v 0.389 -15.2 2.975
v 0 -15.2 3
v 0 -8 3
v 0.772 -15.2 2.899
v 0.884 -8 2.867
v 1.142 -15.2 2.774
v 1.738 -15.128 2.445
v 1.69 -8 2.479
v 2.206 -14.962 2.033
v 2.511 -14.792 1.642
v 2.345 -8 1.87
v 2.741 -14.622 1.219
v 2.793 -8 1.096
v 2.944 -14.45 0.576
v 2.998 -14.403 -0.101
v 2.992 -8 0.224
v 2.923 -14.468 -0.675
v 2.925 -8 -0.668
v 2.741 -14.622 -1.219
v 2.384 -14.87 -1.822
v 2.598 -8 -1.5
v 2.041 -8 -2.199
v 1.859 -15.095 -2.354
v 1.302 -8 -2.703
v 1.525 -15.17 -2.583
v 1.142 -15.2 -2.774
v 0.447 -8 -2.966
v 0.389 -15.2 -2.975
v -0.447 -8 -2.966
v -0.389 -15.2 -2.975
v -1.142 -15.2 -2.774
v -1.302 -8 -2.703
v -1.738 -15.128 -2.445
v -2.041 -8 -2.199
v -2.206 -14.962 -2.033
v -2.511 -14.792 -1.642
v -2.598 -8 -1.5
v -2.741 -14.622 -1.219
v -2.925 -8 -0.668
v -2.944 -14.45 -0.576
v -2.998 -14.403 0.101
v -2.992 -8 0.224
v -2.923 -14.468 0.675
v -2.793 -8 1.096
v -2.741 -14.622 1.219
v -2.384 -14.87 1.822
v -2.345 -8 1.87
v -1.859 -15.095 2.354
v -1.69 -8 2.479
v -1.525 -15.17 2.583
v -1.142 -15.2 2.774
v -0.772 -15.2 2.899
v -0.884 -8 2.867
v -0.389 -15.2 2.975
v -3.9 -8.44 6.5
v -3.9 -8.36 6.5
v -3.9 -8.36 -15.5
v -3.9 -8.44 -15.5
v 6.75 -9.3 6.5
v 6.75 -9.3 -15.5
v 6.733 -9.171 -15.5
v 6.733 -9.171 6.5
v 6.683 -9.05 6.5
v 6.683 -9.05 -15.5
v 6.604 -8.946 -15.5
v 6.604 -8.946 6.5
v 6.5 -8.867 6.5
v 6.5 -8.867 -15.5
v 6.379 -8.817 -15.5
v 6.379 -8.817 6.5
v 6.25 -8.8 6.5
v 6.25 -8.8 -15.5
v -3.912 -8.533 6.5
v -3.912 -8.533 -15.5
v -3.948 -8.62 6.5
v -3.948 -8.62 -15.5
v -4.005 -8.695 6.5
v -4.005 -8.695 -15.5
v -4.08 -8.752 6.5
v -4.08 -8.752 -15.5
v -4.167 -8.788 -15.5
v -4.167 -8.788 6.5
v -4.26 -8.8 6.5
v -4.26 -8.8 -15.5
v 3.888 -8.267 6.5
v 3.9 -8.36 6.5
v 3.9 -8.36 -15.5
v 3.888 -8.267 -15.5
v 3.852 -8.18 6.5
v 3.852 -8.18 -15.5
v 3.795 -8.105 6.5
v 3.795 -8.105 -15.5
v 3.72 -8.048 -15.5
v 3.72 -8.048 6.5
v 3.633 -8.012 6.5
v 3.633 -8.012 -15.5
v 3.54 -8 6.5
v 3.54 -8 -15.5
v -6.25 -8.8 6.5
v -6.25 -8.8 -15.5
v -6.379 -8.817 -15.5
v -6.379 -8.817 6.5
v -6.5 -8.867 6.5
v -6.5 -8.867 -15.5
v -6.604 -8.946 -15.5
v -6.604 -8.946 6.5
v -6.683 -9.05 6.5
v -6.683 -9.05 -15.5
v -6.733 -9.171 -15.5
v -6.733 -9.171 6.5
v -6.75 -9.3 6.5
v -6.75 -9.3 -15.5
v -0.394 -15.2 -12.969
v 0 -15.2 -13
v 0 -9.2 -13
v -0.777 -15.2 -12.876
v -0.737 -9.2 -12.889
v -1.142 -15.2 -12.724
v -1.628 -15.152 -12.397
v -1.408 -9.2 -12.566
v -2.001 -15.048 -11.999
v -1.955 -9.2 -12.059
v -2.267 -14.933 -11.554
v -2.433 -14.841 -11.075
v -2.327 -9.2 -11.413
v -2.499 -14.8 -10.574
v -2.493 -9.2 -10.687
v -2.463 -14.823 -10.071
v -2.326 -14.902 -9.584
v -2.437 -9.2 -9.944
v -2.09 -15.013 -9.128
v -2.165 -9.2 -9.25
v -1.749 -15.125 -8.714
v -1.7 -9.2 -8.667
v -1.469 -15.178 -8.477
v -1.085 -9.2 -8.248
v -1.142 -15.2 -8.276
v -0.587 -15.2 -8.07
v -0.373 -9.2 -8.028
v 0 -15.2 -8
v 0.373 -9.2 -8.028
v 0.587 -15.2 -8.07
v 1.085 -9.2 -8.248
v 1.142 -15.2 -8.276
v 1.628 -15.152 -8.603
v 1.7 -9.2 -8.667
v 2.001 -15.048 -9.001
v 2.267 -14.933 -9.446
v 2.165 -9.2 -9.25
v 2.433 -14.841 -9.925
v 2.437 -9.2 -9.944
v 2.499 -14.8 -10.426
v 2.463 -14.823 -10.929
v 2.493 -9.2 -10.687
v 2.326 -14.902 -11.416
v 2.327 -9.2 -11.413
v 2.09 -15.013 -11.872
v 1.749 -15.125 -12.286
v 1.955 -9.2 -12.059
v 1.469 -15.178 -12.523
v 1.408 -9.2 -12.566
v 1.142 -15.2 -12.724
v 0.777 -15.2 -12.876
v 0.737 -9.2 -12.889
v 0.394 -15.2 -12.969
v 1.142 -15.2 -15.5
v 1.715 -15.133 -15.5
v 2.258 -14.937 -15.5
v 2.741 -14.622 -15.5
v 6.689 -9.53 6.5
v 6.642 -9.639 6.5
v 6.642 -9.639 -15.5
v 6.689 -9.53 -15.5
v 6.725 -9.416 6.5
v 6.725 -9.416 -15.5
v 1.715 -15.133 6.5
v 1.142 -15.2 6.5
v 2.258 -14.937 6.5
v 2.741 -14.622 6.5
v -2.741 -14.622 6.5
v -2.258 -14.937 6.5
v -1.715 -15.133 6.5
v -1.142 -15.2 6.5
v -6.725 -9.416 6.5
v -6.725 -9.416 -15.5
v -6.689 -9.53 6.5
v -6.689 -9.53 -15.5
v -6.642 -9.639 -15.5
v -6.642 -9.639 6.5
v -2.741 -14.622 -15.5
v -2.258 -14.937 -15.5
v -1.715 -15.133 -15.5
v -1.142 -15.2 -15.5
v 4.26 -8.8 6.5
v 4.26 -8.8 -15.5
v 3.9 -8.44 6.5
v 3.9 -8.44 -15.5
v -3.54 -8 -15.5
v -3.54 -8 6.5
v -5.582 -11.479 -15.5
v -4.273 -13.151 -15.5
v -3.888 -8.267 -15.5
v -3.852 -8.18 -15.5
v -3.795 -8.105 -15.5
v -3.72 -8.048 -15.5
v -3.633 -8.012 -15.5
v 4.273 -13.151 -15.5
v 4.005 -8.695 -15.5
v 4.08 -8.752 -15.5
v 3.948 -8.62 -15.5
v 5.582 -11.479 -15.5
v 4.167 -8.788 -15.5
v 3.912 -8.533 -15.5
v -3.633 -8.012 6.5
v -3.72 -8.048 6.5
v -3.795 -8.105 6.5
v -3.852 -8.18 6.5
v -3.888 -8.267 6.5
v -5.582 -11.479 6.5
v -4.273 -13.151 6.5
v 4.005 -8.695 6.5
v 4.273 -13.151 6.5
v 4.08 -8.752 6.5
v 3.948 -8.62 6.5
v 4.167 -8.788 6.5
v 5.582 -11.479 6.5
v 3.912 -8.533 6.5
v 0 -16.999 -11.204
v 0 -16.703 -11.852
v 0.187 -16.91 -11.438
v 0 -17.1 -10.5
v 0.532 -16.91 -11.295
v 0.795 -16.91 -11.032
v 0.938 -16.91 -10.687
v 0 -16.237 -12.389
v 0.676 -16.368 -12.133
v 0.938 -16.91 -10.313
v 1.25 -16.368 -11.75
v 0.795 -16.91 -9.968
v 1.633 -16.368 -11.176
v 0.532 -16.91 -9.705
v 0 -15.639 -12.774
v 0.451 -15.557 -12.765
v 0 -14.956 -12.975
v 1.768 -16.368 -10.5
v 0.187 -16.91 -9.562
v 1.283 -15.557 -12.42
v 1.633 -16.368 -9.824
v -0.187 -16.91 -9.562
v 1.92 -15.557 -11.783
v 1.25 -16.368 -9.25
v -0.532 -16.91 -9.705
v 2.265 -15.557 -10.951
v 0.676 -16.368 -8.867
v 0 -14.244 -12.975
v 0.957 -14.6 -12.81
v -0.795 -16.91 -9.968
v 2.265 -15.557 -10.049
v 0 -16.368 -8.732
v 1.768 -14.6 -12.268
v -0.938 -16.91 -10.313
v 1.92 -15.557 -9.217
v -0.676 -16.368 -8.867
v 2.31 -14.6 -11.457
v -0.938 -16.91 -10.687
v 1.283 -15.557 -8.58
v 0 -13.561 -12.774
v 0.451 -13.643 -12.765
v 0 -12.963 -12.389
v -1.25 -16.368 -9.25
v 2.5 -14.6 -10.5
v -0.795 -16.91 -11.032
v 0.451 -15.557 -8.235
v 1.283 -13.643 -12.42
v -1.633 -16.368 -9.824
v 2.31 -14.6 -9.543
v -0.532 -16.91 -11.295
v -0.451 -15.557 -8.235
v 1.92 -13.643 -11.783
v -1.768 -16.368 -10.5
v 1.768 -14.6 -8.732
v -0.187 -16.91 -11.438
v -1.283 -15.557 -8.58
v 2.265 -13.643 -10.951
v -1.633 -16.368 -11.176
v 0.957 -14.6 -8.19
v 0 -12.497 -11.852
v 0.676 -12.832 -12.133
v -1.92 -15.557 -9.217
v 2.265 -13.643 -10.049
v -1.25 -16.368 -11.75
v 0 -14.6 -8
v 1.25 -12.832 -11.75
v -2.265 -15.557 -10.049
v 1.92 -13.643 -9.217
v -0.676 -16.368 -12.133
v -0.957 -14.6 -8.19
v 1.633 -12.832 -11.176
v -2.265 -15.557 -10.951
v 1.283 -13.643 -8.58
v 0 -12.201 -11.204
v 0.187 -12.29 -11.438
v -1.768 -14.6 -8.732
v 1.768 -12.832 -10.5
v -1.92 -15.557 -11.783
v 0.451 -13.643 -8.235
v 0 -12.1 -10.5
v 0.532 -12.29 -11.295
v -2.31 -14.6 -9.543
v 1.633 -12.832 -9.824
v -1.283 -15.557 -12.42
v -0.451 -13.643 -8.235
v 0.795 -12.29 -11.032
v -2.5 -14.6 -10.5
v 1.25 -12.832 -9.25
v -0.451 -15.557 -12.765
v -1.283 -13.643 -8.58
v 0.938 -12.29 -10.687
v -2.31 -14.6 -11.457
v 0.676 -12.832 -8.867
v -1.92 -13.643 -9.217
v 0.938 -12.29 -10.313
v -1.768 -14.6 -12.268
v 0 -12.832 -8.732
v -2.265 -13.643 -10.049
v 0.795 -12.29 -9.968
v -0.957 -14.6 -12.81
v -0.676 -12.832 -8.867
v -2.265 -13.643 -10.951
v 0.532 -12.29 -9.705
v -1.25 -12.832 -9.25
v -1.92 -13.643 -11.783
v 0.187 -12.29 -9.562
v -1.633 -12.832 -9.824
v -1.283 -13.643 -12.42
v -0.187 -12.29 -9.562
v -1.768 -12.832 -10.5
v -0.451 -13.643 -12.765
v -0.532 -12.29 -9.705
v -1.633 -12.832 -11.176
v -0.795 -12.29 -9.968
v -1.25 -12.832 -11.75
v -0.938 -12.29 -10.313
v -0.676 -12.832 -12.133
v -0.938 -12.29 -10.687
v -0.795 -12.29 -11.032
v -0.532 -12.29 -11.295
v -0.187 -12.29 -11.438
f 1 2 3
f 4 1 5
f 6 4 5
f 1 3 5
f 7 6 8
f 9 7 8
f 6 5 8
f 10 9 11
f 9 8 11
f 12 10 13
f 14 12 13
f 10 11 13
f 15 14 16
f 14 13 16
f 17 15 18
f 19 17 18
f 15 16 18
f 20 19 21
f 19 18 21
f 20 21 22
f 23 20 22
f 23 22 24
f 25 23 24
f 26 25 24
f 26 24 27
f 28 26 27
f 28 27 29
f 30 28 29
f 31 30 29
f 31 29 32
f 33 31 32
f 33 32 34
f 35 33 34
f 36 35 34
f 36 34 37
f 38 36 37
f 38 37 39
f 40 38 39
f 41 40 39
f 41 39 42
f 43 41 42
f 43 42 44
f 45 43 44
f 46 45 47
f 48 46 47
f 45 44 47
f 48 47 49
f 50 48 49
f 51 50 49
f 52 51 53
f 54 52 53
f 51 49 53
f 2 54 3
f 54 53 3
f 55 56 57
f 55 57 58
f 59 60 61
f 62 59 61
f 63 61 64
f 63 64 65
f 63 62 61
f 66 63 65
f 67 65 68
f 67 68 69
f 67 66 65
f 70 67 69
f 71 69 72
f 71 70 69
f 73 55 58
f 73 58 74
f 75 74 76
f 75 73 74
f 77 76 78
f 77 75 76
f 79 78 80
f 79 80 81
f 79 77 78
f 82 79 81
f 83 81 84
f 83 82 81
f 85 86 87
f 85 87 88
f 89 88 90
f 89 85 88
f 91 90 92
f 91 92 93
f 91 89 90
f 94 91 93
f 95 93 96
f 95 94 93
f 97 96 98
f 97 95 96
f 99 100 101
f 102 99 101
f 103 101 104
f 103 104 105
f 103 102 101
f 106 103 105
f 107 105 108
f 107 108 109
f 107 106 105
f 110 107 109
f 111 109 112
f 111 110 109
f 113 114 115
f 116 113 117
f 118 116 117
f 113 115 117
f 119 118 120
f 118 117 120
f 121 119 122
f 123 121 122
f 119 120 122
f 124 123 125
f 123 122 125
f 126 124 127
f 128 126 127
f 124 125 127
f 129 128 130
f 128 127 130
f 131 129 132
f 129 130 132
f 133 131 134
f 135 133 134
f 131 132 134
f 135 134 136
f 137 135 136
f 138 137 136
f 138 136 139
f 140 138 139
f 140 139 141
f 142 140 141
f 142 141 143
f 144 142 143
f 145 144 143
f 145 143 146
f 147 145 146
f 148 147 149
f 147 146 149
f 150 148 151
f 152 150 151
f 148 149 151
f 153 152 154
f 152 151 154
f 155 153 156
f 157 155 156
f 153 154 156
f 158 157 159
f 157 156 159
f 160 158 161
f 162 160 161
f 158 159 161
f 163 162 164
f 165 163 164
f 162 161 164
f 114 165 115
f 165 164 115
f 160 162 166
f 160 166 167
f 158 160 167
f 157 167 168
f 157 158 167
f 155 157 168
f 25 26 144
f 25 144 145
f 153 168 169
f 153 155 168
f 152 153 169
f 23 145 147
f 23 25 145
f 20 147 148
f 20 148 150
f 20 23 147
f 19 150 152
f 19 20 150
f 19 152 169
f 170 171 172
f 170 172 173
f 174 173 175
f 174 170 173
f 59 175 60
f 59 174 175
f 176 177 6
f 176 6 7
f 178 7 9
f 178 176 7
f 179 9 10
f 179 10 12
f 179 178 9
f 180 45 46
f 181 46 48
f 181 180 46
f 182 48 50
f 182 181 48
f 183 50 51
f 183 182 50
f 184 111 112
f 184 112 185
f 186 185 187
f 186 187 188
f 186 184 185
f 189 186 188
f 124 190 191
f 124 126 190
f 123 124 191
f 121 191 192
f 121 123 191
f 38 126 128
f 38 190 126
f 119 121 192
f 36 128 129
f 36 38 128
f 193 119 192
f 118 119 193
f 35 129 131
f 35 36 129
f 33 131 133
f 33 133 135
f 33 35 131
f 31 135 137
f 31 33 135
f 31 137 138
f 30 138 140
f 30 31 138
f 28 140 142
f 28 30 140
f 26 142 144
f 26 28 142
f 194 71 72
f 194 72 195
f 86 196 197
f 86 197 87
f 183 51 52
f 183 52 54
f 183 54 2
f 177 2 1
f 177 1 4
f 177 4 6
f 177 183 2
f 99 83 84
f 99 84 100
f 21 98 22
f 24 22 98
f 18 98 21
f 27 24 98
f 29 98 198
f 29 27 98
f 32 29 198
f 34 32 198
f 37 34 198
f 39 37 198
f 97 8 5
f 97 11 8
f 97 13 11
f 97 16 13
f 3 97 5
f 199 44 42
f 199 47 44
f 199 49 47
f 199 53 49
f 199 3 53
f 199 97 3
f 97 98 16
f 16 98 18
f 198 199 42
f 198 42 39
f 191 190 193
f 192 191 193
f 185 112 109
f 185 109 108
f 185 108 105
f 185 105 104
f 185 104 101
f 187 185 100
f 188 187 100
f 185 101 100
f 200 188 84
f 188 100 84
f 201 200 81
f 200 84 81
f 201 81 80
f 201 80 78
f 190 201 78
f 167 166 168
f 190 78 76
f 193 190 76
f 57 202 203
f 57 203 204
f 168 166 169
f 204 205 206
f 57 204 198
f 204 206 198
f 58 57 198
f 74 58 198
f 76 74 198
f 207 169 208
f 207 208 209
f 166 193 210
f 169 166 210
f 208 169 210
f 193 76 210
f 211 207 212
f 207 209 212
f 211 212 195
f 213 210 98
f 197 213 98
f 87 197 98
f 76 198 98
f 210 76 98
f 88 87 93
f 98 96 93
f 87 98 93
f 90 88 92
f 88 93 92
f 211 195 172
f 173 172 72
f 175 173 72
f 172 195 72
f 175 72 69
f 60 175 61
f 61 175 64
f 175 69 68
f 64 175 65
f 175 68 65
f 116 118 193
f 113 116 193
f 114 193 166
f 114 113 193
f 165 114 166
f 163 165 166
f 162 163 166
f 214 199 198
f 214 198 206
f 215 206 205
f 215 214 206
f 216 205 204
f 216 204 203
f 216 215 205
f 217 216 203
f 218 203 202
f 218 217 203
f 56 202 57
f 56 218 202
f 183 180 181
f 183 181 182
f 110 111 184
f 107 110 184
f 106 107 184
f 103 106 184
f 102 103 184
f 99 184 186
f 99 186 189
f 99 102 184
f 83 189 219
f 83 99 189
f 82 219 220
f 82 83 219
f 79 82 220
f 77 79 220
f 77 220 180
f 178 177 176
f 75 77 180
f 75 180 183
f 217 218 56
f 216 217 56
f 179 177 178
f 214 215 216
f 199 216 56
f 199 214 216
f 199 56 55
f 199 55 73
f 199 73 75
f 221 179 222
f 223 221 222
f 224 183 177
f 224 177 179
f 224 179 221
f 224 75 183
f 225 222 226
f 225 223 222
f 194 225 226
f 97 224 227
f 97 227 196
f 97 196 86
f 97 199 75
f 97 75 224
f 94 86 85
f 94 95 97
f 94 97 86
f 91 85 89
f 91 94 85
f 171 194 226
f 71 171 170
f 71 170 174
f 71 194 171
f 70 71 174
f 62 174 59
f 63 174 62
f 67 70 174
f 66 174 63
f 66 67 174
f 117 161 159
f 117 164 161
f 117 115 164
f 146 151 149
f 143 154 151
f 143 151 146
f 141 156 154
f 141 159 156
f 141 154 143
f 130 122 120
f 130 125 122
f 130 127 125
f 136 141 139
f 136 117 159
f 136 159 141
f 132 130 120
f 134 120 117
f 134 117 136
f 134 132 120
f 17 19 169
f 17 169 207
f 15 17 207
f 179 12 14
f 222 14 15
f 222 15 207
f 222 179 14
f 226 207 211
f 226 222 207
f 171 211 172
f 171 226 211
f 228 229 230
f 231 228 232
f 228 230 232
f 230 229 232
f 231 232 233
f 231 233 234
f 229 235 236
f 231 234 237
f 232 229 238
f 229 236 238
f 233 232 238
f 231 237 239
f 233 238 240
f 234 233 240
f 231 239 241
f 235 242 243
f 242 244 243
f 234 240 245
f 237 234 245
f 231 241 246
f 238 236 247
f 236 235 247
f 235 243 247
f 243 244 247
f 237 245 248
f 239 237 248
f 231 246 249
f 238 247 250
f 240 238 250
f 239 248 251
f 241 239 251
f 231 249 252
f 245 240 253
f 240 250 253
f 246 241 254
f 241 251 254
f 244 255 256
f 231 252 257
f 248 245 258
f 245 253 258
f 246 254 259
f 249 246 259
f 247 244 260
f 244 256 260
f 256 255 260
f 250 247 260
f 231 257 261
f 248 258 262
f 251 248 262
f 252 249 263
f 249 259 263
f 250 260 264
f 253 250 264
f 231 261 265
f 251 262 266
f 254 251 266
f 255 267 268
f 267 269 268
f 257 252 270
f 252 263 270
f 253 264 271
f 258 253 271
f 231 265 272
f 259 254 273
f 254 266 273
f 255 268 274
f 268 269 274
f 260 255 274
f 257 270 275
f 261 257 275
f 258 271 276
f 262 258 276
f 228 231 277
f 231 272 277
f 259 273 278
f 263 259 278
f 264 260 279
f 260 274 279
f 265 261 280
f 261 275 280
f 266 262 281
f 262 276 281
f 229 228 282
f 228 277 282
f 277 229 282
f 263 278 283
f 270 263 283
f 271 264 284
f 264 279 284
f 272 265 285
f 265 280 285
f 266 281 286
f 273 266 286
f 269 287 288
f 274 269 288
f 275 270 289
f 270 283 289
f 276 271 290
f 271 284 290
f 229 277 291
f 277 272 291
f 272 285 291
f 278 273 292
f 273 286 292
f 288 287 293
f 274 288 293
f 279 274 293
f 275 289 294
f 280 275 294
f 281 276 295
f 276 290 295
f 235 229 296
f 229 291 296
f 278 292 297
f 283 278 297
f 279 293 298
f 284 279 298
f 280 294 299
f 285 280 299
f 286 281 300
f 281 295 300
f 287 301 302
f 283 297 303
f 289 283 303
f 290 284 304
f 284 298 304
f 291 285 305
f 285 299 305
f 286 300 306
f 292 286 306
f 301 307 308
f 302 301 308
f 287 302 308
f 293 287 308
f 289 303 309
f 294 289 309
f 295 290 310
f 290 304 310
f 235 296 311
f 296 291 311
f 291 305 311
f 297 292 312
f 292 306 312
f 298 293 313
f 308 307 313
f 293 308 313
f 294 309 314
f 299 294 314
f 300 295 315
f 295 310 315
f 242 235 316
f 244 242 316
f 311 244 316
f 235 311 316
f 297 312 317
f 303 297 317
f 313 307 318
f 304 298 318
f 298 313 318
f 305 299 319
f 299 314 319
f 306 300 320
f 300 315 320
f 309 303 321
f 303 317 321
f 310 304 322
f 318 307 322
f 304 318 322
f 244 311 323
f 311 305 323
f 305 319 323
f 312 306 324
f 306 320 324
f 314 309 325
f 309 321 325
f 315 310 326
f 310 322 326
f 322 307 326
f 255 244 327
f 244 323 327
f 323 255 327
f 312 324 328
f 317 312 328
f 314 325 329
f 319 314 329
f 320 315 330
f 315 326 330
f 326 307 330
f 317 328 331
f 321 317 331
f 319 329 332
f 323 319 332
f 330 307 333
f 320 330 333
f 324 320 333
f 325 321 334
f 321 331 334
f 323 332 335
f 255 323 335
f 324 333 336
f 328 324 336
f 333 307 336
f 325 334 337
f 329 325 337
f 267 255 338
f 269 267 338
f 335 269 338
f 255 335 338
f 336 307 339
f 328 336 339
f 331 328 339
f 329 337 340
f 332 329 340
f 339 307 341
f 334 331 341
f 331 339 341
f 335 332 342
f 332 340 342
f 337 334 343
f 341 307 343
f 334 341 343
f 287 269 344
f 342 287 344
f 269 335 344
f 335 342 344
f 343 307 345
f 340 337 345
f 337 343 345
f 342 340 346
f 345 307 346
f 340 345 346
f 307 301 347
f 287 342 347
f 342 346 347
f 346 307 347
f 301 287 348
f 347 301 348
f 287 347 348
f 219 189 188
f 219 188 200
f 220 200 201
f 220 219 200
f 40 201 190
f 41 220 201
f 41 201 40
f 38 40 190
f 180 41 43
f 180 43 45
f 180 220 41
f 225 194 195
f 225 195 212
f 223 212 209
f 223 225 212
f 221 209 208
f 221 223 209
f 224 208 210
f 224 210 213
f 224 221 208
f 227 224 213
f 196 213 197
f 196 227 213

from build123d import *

# Parameters (mm, degrees)
SKETCH1_R           = 3
BOSS_EXTRUDE1_DEPTH = 16
CUT_SWEEP1_PITCH    = 1
SKETCH4_OUTSIDE_W   = 13.622
SKETCH4_OUTSIDE_H   = 13.622
SKETCH4_OUTSIDE_R   = 2.242227772
CUT_EXTRUDE1_DEPTH  = 1
CUT_EXTRUDE1_DRAFT  = -45
CUT_EXTRUDE2_DEPTH  = 2.4
BOSS_EXTRUDE2_START = 6.5
BOSS_EXTRUDE2_DEPTH = 22
SKETCH9_R           = 3
CUT_EXTRUDE4_DEPTH  = 24.276866267
SKETCH10_W          = 2.5
SKETCH10_H          = 6


with BuildPart() as part:
    # Sketch1 → Boss-Extrude1 (new body)
    with BuildSketch(Plane(origin=(0, 0, 0), x_dir=(1, 0, 0), z_dir=(0, 1, 0))):
        with Locations(Location((0, 0, 0), (0, 0, 270))):
            Circle(SKETCH1_R)
    extrude(amount=-BOSS_EXTRUDE1_DEPTH)

    # Cut-Sweep1: arcs per turn and ends read off the stored shape
    # Cut-Sweep1: the profile of Sketch3 screwed along a right-hand helix through 18 turns, 8 arcs to a turn; built about Z, then put on its axis
    cut_sweep1_z = Axis((0, 0, 0), (0, 0, 1))
    cut_sweep1_corners = [(2.350480947, 0, -1.375), (3.054126588, 0, -0.96875), (3.054126588, 0, -1.90625), (2.350480947, 0, -1.5)]
    with BuildLine(mode=Mode.PRIVATE) as cut_sweep1_profile:
        Line(cut_sweep1_corners[0], cut_sweep1_corners[1])
        Line(cut_sweep1_corners[1], cut_sweep1_corners[2])
        Line(cut_sweep1_corners[2], cut_sweep1_corners[3])
        Line(cut_sweep1_corners[3], cut_sweep1_corners[0])
    cut_sweep1_cap = Face(cut_sweep1_profile.wire())
    cut_sweep1_turn_angles = [0, 22.5, 45, 67.5, 90, 112.5, 135, 157.5, 180, 202.5, 225, 247.5, 270, 292.5, 315, 337.5, 360]
    cut_sweep1_turn_weights = [1, 0.9238795325112867, 1, 0.9238795325112867, 1, 0.9238795325112867, 1, 0.9238795325112867, 1, 0.9238795325112867, 1, 0.9238795325112867, 1, 0.9238795325112867, 1, 0.9238795325112867, 1]
    cut_sweep1_turn_rails = [Edge.make_bspline([Vector(p[0], p[1], 0).rotate(cut_sweep1_z, cut_sweep1_turn_angles[k]) / cut_sweep1_turn_weights[k] + Vector(0, 0, p[2] + CUT_SWEEP1_PITCH * cut_sweep1_turn_angles[k] / 360) for k in range(17)], [0, 0, 0, 1, 1, 2, 2, 3, 3, 4, 4, 5, 5, 6, 6, 7, 7, 8, 8, 8], 2, cut_sweep1_turn_weights) for p in cut_sweep1_corners]
    cut_sweep1_turn_sides = [Face.make_surface_from_curves(cut_sweep1_turn_rails[p[0]], cut_sweep1_turn_rails[p[1]]) for p in [(0, 1), (1, 2), (2, 3), (3, 0)]]
    cut_sweep1 = Plane(origin=(0, -16, 0), x_dir=(0, 0, -1), z_dir=(0, 1, 0)) * Solid(Shell([*[p.moved(Location((0, 0, CUT_SWEEP1_PITCH * i))) for i in range(18) for p in cut_sweep1_turn_sides], cut_sweep1_cap, cut_sweep1_cap.rotate(cut_sweep1_z, 6480).moved(Location((0, 0, CUT_SWEEP1_PITCH * 6480 / 360)))]))
    add(cut_sweep1, mode=Mode.SUBTRACT)


with BuildPart() as cut_extrude1_tool:
    # Sketch4 outside → Cut-Extrude1 (with draft: the straight prism first)
    with BuildSketch(Plane.XZ.offset(16)):
        Rectangle(SKETCH4_OUTSIDE_W, SKETCH4_OUTSIDE_H)
        Circle(SKETCH4_OUTSIDE_R, mode=Mode.SUBTRACT)
    extrude(amount=-CUT_EXTRUDE1_DEPTH)
    # Cut-Extrude1: the draft: its side faces are tilted about the plane it starts from
    cut_extrude1_sides = [cut_extrude1_tool.faces().sort_by_distance(p)[0] for p in [
        (0, -15.5, -6.811),
        (6.811, -15.5, 0),
        (0, -15.5, 6.811),
        (-6.811, -15.5, 0),
        (-2.242227772, -15.5, 0),
    ]]
    draft(cut_extrude1_sides, Plane.XZ.offset(16), CUT_EXTRUDE1_DRAFT)


with BuildPart() as part_1:
    add(part.part)

    # Cut-Extrude1: cut by cut_extrude1_tool
    add(cut_extrude1_tool.part, mode=Mode.SUBTRACT)

    # Sketch5 → Revolve1 (revolve)
    with BuildSketch(Plane.XY, mode=Mode.PRIVATE) as revolve1_sk:
        with BuildLine():
            Line((0, 3.3), (0, 0))
            Line((0, 0), (-5.25, 0))
            Line((-5.25, 0), (-5.25, 0.825))
            ThreePointArc((-5.25, 0.825), (-4.306626435, 2.227614941), (-3, 3.3))
            Line((-3, 3.3), (0, 3.3))
        make_face()
    revolve(revolve1_sk.sketch.rotate(Axis((0, 0, 0), (0, -1, 0)), 90), axis=Axis((0, 0, 0), (0, -1, 0)))

    # Sketch6 → Cut-Extrude2 (cut)
    with BuildSketch(Plane(origin=(0, 3.3, 0), x_dir=(1, 0, 0), z_dir=(0, 1, 0))):
        Polygon((0, 2.309401077), (-2, 1.154700538), (-2, -1.154700538), (0, -2.309401077), (2, -1.154700538), (2, 1.154700538), align=None)
    extrude(amount=-CUT_EXTRUDE2_DEPTH, mode=Mode.SUBTRACT)

    # Cut-Extrude3 cone 1 section (through the dimple's axis) → Cut-Extrude3 (revolve, cut)
    with BuildSketch(Plane(origin=(0, 3.3, 0), x_dir=(0, 0, 1), z_dir=(1, 0, 0))):
        Polygon((0, 0), (2.309401077, 0), (0, 2.309401077), align=None)
    revolve(axis=Axis((0, 3.3, 0), (0, -1, 0)), mode=Mode.SUBTRACT)


with BuildPart() as body_2:
    # Sketch8 → Boss-Extrude2 (new body)
    with BuildSketch(Plane.XY.offset(BOSS_EXTRUDE2_START)):
        with BuildLine():
            Line((-1.141910018, -15.2), (1.141910018, -15.2))
            ThreePointArc((1.141910018, -15.2), (1.992150427, -15.050976658), (2.741026302, -14.621672998))
            ThreePointArc((2.741026302, -14.621672998), (4.957086228, -12.338580682), (6.641744362, -9.639440246))
            ThreePointArc((6.641744362, -9.639440246), (6.708027965, -9.473596894), (6.75, -9.3))
            ThreePointArc((6.75, -9.3), (6.603553391, -8.946446609), (6.25, -8.8))
            Line((6.25, -8.8), (4.26, -8.8))
            ThreePointArc((4.26, -8.8), (4.005441559, -8.694558441), (3.9, -8.44))
            Line((3.9, -8.44), (3.9, -8.36))
            ThreePointArc((3.9, -8.36), (3.794558441, -8.105441559), (3.54, -8))
            Line((3.54, -8), (-3.54, -8))
            ThreePointArc((-3.54, -8), (-3.794558441, -8.105441559), (-3.9, -8.36))
            Line((-3.9, -8.36), (-3.9, -8.44))
            ThreePointArc((-3.9, -8.44), (-4.005441559, -8.694558441), (-4.26, -8.8))
            Line((-4.26, -8.8), (-6.25, -8.8))
            ThreePointArc((-6.25, -8.8), (-6.603553391, -8.946446609), (-6.75, -9.3))
            ThreePointArc((-6.75, -9.3), (-6.708027965, -9.473596894), (-6.641744362, -9.639440246))
            ThreePointArc((-6.641744362, -9.639440246), (-4.957086228, -12.338580682), (-2.741026302, -14.621672998))
            ThreePointArc((-2.741026302, -14.621672998), (-1.992150427, -15.050976658), (-1.141910018, -15.2))
        make_face()
    extrude(amount=-BOSS_EXTRUDE2_DEPTH)

    # Sketch9 → Cut-Extrude4 (cut, through all)
    with BuildSketch(Plane(origin=(0, 0, 0), x_dir=(1, 0, 0), z_dir=(0, 1, 0))):
        with Locations(Location((0, 0, 0), (0, 0, 270))):
            Circle(SKETCH9_R)
    extrude(amount=-CUT_EXTRUDE4_DEPTH, mode=Mode.SUBTRACT)

    # Sketch10 → Cut-Revolve1 (revolve, cut)
    with BuildSketch(Plane(origin=(0, 0, 0), x_dir=(0, 0, -1), z_dir=(1, 0, 0))):
        with Locations((11.75, -12.2)):
            Rectangle(SKETCH10_W, SKETCH10_H)
    revolve(axis=Axis((0, -9.2, -10.5), (0, 1, 0)), mode=Mode.SUBTRACT)


with BuildPart() as body_3:
    # Sketch11 → Revolve2 (revolve)
    with BuildSketch(Plane(origin=(0, 0, 0), x_dir=(0, 0, -1), z_dir=(1, 0, 0))):
        with BuildLine():
            Line((10.5, -12.1), (10.5, -17.1))
            ThreePointArc((10.5, -17.1), (13, -14.6), (10.5, -12.1))
        make_face()
    revolve(axis=Axis((0, -12.1, -10.5), (0, -1, 0)))


solid = Compound([body_2.part, body_3.part])
